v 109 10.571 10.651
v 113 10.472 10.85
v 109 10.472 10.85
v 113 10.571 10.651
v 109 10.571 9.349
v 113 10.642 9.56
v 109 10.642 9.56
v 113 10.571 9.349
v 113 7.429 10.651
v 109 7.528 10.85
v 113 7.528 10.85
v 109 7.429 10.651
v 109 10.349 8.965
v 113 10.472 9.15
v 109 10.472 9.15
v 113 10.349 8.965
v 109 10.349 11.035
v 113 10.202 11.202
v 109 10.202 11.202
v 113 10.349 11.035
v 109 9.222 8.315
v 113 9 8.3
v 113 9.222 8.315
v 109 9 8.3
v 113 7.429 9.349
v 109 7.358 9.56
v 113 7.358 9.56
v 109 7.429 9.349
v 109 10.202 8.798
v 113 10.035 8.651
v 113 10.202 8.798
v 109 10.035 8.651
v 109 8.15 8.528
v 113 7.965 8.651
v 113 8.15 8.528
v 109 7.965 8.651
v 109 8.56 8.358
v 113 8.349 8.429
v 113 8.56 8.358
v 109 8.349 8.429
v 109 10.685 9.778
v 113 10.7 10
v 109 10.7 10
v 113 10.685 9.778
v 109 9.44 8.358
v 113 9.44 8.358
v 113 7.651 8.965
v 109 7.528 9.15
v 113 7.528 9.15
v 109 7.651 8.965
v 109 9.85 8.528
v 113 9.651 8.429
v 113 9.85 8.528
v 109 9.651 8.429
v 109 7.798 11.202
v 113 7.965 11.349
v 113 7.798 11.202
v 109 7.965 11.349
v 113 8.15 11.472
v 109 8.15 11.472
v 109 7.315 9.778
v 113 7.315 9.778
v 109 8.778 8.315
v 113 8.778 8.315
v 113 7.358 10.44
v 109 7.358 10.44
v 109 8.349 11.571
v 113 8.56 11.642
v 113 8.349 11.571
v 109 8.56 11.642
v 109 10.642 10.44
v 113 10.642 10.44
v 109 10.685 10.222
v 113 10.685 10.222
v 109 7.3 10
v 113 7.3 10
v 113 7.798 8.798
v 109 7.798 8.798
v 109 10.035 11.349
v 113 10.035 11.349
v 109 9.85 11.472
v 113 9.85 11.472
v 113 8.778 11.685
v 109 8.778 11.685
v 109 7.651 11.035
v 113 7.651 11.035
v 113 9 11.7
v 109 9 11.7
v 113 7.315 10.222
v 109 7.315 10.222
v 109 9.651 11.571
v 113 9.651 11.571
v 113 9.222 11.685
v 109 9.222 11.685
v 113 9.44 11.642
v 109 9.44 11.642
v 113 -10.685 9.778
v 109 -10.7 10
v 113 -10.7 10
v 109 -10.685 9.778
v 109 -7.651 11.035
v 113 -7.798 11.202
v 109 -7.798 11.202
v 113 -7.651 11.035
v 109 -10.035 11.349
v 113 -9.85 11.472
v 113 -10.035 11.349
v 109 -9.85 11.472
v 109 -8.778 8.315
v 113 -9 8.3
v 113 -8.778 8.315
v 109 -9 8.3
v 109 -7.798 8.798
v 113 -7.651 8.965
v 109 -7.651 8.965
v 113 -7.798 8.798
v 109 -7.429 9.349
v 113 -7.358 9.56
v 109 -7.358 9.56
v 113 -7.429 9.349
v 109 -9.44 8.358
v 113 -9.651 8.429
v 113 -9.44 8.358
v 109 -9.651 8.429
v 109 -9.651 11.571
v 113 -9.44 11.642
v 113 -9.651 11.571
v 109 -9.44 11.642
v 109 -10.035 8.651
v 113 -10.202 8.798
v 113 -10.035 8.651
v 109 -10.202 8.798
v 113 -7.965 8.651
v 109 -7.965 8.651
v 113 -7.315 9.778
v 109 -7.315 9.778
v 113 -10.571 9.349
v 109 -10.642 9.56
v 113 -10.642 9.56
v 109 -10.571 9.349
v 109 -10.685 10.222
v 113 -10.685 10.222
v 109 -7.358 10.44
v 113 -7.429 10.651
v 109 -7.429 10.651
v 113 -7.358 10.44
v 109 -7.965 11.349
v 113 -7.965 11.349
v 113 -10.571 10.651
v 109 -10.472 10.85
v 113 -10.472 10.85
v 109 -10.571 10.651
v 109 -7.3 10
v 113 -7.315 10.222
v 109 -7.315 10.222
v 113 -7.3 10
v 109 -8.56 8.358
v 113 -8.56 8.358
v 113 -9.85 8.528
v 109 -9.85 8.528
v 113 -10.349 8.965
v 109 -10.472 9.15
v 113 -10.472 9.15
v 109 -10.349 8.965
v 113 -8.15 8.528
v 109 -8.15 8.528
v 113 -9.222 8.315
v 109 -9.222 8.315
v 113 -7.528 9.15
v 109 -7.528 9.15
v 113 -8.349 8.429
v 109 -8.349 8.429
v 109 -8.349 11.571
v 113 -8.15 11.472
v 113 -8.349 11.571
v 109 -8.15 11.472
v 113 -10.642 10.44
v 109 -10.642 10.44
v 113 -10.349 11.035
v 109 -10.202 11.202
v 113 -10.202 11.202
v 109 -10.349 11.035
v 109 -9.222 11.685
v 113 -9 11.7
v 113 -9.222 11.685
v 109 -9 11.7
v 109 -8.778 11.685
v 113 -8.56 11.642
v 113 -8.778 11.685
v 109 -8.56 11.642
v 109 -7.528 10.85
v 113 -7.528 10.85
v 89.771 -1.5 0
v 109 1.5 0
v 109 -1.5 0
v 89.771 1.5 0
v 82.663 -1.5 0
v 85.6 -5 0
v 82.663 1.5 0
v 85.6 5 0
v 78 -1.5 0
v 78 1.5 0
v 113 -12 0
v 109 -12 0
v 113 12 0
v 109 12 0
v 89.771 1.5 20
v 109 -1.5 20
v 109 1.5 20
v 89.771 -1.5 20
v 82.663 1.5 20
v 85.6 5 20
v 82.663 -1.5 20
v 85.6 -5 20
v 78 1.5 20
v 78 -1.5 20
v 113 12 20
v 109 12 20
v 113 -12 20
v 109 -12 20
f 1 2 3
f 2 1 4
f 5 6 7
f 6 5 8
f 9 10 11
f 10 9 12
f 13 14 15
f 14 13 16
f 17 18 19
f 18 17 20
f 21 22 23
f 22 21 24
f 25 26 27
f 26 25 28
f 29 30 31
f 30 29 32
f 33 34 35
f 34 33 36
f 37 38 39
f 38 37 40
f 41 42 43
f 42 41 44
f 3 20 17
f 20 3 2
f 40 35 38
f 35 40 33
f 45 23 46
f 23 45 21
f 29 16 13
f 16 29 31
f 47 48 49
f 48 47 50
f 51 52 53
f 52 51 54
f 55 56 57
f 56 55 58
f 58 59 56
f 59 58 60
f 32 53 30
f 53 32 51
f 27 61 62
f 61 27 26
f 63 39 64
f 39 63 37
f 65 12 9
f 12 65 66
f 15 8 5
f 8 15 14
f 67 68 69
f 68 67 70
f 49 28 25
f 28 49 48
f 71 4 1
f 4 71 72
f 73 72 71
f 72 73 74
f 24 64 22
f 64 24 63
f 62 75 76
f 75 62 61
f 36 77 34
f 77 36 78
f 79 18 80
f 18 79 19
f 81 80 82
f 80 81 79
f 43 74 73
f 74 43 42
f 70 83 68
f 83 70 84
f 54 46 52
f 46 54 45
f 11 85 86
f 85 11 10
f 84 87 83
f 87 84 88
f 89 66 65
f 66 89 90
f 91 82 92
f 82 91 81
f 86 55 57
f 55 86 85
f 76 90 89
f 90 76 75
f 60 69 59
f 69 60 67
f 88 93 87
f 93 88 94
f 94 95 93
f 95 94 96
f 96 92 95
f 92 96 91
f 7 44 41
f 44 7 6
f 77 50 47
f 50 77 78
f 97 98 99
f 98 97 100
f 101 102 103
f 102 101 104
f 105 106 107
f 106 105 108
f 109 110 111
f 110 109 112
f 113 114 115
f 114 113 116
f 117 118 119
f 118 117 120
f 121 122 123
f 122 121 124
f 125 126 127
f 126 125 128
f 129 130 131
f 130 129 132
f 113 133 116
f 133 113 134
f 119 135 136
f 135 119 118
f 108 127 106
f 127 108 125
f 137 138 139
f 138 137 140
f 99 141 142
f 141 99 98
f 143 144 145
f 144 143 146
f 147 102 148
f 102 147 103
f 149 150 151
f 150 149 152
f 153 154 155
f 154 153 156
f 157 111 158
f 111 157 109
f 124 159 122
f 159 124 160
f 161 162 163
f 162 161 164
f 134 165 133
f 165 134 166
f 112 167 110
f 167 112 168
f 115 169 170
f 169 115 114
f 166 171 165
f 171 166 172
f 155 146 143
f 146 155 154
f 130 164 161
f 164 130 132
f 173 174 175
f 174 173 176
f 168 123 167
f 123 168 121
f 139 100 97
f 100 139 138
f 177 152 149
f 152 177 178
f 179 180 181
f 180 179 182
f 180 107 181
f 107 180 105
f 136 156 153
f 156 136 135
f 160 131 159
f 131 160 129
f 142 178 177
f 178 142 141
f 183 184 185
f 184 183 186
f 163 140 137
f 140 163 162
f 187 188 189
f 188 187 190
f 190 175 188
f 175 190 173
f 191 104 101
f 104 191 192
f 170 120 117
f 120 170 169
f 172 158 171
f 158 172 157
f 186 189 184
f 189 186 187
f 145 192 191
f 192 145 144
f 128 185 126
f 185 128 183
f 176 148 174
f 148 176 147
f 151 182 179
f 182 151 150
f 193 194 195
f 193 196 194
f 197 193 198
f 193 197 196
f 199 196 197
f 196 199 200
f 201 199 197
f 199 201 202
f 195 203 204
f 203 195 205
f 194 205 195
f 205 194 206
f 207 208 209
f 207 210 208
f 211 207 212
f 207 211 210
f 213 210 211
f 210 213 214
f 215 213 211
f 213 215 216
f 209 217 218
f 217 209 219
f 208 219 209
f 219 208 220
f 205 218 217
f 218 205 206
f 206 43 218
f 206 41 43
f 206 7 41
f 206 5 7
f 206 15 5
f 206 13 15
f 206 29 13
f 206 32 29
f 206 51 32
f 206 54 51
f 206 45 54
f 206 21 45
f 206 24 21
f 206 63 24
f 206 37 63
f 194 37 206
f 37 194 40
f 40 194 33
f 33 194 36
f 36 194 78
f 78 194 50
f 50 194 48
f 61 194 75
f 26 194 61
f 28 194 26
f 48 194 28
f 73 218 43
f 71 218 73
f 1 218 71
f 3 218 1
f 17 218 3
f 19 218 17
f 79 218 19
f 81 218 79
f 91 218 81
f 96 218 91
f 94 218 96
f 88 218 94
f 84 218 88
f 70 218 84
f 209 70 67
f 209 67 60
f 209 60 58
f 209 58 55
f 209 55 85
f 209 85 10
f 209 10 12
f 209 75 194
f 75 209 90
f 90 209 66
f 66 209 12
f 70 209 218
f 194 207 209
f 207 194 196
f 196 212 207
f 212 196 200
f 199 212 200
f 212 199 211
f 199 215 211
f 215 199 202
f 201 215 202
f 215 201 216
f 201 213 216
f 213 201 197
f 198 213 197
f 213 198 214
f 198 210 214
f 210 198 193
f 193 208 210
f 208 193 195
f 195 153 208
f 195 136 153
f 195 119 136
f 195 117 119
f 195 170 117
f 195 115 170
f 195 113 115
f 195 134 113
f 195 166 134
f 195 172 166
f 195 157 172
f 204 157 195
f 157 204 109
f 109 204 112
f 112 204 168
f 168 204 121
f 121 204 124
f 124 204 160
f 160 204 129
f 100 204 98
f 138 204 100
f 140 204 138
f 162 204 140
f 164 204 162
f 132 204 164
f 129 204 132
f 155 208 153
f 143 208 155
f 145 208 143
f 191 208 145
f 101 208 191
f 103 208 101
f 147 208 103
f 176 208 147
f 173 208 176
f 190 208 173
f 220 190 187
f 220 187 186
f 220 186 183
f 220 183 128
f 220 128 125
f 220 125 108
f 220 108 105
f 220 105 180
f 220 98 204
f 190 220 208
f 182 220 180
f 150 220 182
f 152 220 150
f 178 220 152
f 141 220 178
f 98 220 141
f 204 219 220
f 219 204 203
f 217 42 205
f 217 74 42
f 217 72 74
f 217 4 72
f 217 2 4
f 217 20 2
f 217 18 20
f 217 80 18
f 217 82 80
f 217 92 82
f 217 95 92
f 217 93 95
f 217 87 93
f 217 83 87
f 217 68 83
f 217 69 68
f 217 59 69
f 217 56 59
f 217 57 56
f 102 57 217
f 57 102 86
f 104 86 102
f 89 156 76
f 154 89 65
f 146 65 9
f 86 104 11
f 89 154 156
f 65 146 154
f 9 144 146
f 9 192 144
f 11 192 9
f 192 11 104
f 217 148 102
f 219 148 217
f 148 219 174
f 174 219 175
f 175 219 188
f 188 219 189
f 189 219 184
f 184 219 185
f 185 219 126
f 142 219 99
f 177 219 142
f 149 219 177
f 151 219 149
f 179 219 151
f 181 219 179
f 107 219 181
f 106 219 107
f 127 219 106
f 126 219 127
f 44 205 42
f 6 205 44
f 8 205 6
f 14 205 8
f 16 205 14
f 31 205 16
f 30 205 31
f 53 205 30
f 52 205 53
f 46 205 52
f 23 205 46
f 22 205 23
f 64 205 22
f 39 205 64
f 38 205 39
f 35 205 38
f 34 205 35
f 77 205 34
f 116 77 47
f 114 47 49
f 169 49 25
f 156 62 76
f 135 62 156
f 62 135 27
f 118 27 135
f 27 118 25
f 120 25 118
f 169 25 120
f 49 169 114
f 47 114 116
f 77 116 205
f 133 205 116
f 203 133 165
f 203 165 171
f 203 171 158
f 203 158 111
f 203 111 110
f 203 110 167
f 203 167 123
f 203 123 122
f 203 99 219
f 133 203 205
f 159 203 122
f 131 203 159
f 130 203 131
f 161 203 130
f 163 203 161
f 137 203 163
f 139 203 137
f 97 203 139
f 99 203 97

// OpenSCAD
// connector.scad -- the edge connector (task.py: _blade, _contacts), mm.
//
// PART = "blade"    the cage-side blade (CAGE frame, for the left bay; print two). A BLADE_T core from its tip at
//                   BLADE_X[0] through the back stop and rail, two ridges with RIDGE_DEG (50-degree) front faces and
//                   90 - RIDGE_DEG (40-degree) back faces cresting at RIDGE_APEX, and a flange that screws to the rail's
//                   rear face. The flange sets the ridge's position along the bay. Insert it from behind the cage.
//        "contact"  one sprung contact carrier (SUPPLY frame, the left one at rest; print two and turn one over for
//                   the right: the part is a prism, so turned over it is its own mirror image). Its tip is task.py's
//                   contact (CONTACT_X x CONTACT_Y x CONTACT_Z); the body behind it slides in a pocket of the contact
//                   housing (psu_shell.scad) on an M3 guide screw that passes through its spring.
//        "assembly" both in place, the right way up.
// Both print standing on their bottom face (z up): the ridge and contact faces are then smooth vertical walls along
// the sliding direction, and the screw holes are horizontal.

include <params.scad>

PART = "blade";

// One ridge in plan, as task._blade builds it: a block with sides RIDGE_SIDES, yawed side * RIDGE_DEG, whose apex
// corner sits at RIDGE_APEX (mirrored to this side). Its front face rises at RIDGE_DEG, its back face falls at
// 90 - RIDGE_DEG.
module ridge_2d(side) {
    a = side * RIDGE_DEG;
    lu = RIDGE_SIDES[0];
    lv = RIDGE_SIDES[1];
    ux = cos(a);
    uy = sin(a);
    vx = -sin(a);
    vy = cos(a);
    cx = RIDGE_APEX[0] - lu / 2 * ux - side * lv / 2 * vx;
    cy = side * RIDGE_APEX[1] - lu / 2 * uy - side * lv / 2 * vy;
    translate([cx, cy]) rotate(a) square([lu, lv], center = true);
}

module blade() {
    rear = SERVER[0] + REAR_RAIL_D;
    zc = (BLADE_Z[0] + BLADE_Z[1]) / 2;
    difference() {
        translate([0, 0, BLADE_Z[0]]) linear_extrude(height = BLADE_Z[1] - BLADE_Z[0]) union() {
            translate([BLADE_X[0], -BLADE_T / 2]) square([rear - BLADE_X[0], BLADE_T]);
            ridge_2d(1);
            ridge_2d(-1);
            translate([rear, -BLADE_FLANGE_W / 2]) square([BLADE_FLANGE_T, BLADE_FLANGE_W]);
        }
        for (s = [1, -1])
            translate([rear - EPS, s * BLADE_SCREW_DY, zc]) rotate([0, 90, 0])
                cylinder(h = BLADE_FLANGE_T + 2 * EPS, d = M3_CLEAR);
    }
}

module contact_carrier() {
    zc = (CONTACT_Z[0] + CONTACT_Z[1]) / 2;
    difference() {
        translate([0, 0, CONTACT_Z[0]]) linear_extrude(height = CONTACT_Z[1] - CONTACT_Z[0]) union() {
            // the contact tip (task.py's contact block)
            translate([CONTACT_X[0], CONTACT_Y[0]]) square([CONTACT_X[1] - CONTACT_X[0], CONTACT_Y[1] - CONTACT_Y[0]]);
            // the body that slides in the housing's pocket, outboard of the ridge's crest
            translate([CARRIER_X0, CONTACT_Y[1] - EPS]) square([CONTACT_X[1] - CARRIER_X0, CARRIER_Y1 - CONTACT_Y[1] + EPS]);
        }
        // pilot for the M3 guide screw (it cuts its own thread; turning it sets the contact's rest position)
        translate([CARRIER_SCREW_X, CARRIER_Y1 + EPS, zc]) rotate([90, 0, 0])
            cylinder(h = CARRIER_SCREW_DEPTH + EPS, d = M3_PILOT);
    }
}

if (PART == "blade") translate([0, 0, -BLADE_Z[0]]) blade();
else if (PART == "contact") translate([0, 0, -CONTACT_Z[0]]) contact_carrier();
else if (PART == "assembly") {
    blade();
    contact_carrier();
    mirror([0, 1, 0]) contact_carrier();
}
